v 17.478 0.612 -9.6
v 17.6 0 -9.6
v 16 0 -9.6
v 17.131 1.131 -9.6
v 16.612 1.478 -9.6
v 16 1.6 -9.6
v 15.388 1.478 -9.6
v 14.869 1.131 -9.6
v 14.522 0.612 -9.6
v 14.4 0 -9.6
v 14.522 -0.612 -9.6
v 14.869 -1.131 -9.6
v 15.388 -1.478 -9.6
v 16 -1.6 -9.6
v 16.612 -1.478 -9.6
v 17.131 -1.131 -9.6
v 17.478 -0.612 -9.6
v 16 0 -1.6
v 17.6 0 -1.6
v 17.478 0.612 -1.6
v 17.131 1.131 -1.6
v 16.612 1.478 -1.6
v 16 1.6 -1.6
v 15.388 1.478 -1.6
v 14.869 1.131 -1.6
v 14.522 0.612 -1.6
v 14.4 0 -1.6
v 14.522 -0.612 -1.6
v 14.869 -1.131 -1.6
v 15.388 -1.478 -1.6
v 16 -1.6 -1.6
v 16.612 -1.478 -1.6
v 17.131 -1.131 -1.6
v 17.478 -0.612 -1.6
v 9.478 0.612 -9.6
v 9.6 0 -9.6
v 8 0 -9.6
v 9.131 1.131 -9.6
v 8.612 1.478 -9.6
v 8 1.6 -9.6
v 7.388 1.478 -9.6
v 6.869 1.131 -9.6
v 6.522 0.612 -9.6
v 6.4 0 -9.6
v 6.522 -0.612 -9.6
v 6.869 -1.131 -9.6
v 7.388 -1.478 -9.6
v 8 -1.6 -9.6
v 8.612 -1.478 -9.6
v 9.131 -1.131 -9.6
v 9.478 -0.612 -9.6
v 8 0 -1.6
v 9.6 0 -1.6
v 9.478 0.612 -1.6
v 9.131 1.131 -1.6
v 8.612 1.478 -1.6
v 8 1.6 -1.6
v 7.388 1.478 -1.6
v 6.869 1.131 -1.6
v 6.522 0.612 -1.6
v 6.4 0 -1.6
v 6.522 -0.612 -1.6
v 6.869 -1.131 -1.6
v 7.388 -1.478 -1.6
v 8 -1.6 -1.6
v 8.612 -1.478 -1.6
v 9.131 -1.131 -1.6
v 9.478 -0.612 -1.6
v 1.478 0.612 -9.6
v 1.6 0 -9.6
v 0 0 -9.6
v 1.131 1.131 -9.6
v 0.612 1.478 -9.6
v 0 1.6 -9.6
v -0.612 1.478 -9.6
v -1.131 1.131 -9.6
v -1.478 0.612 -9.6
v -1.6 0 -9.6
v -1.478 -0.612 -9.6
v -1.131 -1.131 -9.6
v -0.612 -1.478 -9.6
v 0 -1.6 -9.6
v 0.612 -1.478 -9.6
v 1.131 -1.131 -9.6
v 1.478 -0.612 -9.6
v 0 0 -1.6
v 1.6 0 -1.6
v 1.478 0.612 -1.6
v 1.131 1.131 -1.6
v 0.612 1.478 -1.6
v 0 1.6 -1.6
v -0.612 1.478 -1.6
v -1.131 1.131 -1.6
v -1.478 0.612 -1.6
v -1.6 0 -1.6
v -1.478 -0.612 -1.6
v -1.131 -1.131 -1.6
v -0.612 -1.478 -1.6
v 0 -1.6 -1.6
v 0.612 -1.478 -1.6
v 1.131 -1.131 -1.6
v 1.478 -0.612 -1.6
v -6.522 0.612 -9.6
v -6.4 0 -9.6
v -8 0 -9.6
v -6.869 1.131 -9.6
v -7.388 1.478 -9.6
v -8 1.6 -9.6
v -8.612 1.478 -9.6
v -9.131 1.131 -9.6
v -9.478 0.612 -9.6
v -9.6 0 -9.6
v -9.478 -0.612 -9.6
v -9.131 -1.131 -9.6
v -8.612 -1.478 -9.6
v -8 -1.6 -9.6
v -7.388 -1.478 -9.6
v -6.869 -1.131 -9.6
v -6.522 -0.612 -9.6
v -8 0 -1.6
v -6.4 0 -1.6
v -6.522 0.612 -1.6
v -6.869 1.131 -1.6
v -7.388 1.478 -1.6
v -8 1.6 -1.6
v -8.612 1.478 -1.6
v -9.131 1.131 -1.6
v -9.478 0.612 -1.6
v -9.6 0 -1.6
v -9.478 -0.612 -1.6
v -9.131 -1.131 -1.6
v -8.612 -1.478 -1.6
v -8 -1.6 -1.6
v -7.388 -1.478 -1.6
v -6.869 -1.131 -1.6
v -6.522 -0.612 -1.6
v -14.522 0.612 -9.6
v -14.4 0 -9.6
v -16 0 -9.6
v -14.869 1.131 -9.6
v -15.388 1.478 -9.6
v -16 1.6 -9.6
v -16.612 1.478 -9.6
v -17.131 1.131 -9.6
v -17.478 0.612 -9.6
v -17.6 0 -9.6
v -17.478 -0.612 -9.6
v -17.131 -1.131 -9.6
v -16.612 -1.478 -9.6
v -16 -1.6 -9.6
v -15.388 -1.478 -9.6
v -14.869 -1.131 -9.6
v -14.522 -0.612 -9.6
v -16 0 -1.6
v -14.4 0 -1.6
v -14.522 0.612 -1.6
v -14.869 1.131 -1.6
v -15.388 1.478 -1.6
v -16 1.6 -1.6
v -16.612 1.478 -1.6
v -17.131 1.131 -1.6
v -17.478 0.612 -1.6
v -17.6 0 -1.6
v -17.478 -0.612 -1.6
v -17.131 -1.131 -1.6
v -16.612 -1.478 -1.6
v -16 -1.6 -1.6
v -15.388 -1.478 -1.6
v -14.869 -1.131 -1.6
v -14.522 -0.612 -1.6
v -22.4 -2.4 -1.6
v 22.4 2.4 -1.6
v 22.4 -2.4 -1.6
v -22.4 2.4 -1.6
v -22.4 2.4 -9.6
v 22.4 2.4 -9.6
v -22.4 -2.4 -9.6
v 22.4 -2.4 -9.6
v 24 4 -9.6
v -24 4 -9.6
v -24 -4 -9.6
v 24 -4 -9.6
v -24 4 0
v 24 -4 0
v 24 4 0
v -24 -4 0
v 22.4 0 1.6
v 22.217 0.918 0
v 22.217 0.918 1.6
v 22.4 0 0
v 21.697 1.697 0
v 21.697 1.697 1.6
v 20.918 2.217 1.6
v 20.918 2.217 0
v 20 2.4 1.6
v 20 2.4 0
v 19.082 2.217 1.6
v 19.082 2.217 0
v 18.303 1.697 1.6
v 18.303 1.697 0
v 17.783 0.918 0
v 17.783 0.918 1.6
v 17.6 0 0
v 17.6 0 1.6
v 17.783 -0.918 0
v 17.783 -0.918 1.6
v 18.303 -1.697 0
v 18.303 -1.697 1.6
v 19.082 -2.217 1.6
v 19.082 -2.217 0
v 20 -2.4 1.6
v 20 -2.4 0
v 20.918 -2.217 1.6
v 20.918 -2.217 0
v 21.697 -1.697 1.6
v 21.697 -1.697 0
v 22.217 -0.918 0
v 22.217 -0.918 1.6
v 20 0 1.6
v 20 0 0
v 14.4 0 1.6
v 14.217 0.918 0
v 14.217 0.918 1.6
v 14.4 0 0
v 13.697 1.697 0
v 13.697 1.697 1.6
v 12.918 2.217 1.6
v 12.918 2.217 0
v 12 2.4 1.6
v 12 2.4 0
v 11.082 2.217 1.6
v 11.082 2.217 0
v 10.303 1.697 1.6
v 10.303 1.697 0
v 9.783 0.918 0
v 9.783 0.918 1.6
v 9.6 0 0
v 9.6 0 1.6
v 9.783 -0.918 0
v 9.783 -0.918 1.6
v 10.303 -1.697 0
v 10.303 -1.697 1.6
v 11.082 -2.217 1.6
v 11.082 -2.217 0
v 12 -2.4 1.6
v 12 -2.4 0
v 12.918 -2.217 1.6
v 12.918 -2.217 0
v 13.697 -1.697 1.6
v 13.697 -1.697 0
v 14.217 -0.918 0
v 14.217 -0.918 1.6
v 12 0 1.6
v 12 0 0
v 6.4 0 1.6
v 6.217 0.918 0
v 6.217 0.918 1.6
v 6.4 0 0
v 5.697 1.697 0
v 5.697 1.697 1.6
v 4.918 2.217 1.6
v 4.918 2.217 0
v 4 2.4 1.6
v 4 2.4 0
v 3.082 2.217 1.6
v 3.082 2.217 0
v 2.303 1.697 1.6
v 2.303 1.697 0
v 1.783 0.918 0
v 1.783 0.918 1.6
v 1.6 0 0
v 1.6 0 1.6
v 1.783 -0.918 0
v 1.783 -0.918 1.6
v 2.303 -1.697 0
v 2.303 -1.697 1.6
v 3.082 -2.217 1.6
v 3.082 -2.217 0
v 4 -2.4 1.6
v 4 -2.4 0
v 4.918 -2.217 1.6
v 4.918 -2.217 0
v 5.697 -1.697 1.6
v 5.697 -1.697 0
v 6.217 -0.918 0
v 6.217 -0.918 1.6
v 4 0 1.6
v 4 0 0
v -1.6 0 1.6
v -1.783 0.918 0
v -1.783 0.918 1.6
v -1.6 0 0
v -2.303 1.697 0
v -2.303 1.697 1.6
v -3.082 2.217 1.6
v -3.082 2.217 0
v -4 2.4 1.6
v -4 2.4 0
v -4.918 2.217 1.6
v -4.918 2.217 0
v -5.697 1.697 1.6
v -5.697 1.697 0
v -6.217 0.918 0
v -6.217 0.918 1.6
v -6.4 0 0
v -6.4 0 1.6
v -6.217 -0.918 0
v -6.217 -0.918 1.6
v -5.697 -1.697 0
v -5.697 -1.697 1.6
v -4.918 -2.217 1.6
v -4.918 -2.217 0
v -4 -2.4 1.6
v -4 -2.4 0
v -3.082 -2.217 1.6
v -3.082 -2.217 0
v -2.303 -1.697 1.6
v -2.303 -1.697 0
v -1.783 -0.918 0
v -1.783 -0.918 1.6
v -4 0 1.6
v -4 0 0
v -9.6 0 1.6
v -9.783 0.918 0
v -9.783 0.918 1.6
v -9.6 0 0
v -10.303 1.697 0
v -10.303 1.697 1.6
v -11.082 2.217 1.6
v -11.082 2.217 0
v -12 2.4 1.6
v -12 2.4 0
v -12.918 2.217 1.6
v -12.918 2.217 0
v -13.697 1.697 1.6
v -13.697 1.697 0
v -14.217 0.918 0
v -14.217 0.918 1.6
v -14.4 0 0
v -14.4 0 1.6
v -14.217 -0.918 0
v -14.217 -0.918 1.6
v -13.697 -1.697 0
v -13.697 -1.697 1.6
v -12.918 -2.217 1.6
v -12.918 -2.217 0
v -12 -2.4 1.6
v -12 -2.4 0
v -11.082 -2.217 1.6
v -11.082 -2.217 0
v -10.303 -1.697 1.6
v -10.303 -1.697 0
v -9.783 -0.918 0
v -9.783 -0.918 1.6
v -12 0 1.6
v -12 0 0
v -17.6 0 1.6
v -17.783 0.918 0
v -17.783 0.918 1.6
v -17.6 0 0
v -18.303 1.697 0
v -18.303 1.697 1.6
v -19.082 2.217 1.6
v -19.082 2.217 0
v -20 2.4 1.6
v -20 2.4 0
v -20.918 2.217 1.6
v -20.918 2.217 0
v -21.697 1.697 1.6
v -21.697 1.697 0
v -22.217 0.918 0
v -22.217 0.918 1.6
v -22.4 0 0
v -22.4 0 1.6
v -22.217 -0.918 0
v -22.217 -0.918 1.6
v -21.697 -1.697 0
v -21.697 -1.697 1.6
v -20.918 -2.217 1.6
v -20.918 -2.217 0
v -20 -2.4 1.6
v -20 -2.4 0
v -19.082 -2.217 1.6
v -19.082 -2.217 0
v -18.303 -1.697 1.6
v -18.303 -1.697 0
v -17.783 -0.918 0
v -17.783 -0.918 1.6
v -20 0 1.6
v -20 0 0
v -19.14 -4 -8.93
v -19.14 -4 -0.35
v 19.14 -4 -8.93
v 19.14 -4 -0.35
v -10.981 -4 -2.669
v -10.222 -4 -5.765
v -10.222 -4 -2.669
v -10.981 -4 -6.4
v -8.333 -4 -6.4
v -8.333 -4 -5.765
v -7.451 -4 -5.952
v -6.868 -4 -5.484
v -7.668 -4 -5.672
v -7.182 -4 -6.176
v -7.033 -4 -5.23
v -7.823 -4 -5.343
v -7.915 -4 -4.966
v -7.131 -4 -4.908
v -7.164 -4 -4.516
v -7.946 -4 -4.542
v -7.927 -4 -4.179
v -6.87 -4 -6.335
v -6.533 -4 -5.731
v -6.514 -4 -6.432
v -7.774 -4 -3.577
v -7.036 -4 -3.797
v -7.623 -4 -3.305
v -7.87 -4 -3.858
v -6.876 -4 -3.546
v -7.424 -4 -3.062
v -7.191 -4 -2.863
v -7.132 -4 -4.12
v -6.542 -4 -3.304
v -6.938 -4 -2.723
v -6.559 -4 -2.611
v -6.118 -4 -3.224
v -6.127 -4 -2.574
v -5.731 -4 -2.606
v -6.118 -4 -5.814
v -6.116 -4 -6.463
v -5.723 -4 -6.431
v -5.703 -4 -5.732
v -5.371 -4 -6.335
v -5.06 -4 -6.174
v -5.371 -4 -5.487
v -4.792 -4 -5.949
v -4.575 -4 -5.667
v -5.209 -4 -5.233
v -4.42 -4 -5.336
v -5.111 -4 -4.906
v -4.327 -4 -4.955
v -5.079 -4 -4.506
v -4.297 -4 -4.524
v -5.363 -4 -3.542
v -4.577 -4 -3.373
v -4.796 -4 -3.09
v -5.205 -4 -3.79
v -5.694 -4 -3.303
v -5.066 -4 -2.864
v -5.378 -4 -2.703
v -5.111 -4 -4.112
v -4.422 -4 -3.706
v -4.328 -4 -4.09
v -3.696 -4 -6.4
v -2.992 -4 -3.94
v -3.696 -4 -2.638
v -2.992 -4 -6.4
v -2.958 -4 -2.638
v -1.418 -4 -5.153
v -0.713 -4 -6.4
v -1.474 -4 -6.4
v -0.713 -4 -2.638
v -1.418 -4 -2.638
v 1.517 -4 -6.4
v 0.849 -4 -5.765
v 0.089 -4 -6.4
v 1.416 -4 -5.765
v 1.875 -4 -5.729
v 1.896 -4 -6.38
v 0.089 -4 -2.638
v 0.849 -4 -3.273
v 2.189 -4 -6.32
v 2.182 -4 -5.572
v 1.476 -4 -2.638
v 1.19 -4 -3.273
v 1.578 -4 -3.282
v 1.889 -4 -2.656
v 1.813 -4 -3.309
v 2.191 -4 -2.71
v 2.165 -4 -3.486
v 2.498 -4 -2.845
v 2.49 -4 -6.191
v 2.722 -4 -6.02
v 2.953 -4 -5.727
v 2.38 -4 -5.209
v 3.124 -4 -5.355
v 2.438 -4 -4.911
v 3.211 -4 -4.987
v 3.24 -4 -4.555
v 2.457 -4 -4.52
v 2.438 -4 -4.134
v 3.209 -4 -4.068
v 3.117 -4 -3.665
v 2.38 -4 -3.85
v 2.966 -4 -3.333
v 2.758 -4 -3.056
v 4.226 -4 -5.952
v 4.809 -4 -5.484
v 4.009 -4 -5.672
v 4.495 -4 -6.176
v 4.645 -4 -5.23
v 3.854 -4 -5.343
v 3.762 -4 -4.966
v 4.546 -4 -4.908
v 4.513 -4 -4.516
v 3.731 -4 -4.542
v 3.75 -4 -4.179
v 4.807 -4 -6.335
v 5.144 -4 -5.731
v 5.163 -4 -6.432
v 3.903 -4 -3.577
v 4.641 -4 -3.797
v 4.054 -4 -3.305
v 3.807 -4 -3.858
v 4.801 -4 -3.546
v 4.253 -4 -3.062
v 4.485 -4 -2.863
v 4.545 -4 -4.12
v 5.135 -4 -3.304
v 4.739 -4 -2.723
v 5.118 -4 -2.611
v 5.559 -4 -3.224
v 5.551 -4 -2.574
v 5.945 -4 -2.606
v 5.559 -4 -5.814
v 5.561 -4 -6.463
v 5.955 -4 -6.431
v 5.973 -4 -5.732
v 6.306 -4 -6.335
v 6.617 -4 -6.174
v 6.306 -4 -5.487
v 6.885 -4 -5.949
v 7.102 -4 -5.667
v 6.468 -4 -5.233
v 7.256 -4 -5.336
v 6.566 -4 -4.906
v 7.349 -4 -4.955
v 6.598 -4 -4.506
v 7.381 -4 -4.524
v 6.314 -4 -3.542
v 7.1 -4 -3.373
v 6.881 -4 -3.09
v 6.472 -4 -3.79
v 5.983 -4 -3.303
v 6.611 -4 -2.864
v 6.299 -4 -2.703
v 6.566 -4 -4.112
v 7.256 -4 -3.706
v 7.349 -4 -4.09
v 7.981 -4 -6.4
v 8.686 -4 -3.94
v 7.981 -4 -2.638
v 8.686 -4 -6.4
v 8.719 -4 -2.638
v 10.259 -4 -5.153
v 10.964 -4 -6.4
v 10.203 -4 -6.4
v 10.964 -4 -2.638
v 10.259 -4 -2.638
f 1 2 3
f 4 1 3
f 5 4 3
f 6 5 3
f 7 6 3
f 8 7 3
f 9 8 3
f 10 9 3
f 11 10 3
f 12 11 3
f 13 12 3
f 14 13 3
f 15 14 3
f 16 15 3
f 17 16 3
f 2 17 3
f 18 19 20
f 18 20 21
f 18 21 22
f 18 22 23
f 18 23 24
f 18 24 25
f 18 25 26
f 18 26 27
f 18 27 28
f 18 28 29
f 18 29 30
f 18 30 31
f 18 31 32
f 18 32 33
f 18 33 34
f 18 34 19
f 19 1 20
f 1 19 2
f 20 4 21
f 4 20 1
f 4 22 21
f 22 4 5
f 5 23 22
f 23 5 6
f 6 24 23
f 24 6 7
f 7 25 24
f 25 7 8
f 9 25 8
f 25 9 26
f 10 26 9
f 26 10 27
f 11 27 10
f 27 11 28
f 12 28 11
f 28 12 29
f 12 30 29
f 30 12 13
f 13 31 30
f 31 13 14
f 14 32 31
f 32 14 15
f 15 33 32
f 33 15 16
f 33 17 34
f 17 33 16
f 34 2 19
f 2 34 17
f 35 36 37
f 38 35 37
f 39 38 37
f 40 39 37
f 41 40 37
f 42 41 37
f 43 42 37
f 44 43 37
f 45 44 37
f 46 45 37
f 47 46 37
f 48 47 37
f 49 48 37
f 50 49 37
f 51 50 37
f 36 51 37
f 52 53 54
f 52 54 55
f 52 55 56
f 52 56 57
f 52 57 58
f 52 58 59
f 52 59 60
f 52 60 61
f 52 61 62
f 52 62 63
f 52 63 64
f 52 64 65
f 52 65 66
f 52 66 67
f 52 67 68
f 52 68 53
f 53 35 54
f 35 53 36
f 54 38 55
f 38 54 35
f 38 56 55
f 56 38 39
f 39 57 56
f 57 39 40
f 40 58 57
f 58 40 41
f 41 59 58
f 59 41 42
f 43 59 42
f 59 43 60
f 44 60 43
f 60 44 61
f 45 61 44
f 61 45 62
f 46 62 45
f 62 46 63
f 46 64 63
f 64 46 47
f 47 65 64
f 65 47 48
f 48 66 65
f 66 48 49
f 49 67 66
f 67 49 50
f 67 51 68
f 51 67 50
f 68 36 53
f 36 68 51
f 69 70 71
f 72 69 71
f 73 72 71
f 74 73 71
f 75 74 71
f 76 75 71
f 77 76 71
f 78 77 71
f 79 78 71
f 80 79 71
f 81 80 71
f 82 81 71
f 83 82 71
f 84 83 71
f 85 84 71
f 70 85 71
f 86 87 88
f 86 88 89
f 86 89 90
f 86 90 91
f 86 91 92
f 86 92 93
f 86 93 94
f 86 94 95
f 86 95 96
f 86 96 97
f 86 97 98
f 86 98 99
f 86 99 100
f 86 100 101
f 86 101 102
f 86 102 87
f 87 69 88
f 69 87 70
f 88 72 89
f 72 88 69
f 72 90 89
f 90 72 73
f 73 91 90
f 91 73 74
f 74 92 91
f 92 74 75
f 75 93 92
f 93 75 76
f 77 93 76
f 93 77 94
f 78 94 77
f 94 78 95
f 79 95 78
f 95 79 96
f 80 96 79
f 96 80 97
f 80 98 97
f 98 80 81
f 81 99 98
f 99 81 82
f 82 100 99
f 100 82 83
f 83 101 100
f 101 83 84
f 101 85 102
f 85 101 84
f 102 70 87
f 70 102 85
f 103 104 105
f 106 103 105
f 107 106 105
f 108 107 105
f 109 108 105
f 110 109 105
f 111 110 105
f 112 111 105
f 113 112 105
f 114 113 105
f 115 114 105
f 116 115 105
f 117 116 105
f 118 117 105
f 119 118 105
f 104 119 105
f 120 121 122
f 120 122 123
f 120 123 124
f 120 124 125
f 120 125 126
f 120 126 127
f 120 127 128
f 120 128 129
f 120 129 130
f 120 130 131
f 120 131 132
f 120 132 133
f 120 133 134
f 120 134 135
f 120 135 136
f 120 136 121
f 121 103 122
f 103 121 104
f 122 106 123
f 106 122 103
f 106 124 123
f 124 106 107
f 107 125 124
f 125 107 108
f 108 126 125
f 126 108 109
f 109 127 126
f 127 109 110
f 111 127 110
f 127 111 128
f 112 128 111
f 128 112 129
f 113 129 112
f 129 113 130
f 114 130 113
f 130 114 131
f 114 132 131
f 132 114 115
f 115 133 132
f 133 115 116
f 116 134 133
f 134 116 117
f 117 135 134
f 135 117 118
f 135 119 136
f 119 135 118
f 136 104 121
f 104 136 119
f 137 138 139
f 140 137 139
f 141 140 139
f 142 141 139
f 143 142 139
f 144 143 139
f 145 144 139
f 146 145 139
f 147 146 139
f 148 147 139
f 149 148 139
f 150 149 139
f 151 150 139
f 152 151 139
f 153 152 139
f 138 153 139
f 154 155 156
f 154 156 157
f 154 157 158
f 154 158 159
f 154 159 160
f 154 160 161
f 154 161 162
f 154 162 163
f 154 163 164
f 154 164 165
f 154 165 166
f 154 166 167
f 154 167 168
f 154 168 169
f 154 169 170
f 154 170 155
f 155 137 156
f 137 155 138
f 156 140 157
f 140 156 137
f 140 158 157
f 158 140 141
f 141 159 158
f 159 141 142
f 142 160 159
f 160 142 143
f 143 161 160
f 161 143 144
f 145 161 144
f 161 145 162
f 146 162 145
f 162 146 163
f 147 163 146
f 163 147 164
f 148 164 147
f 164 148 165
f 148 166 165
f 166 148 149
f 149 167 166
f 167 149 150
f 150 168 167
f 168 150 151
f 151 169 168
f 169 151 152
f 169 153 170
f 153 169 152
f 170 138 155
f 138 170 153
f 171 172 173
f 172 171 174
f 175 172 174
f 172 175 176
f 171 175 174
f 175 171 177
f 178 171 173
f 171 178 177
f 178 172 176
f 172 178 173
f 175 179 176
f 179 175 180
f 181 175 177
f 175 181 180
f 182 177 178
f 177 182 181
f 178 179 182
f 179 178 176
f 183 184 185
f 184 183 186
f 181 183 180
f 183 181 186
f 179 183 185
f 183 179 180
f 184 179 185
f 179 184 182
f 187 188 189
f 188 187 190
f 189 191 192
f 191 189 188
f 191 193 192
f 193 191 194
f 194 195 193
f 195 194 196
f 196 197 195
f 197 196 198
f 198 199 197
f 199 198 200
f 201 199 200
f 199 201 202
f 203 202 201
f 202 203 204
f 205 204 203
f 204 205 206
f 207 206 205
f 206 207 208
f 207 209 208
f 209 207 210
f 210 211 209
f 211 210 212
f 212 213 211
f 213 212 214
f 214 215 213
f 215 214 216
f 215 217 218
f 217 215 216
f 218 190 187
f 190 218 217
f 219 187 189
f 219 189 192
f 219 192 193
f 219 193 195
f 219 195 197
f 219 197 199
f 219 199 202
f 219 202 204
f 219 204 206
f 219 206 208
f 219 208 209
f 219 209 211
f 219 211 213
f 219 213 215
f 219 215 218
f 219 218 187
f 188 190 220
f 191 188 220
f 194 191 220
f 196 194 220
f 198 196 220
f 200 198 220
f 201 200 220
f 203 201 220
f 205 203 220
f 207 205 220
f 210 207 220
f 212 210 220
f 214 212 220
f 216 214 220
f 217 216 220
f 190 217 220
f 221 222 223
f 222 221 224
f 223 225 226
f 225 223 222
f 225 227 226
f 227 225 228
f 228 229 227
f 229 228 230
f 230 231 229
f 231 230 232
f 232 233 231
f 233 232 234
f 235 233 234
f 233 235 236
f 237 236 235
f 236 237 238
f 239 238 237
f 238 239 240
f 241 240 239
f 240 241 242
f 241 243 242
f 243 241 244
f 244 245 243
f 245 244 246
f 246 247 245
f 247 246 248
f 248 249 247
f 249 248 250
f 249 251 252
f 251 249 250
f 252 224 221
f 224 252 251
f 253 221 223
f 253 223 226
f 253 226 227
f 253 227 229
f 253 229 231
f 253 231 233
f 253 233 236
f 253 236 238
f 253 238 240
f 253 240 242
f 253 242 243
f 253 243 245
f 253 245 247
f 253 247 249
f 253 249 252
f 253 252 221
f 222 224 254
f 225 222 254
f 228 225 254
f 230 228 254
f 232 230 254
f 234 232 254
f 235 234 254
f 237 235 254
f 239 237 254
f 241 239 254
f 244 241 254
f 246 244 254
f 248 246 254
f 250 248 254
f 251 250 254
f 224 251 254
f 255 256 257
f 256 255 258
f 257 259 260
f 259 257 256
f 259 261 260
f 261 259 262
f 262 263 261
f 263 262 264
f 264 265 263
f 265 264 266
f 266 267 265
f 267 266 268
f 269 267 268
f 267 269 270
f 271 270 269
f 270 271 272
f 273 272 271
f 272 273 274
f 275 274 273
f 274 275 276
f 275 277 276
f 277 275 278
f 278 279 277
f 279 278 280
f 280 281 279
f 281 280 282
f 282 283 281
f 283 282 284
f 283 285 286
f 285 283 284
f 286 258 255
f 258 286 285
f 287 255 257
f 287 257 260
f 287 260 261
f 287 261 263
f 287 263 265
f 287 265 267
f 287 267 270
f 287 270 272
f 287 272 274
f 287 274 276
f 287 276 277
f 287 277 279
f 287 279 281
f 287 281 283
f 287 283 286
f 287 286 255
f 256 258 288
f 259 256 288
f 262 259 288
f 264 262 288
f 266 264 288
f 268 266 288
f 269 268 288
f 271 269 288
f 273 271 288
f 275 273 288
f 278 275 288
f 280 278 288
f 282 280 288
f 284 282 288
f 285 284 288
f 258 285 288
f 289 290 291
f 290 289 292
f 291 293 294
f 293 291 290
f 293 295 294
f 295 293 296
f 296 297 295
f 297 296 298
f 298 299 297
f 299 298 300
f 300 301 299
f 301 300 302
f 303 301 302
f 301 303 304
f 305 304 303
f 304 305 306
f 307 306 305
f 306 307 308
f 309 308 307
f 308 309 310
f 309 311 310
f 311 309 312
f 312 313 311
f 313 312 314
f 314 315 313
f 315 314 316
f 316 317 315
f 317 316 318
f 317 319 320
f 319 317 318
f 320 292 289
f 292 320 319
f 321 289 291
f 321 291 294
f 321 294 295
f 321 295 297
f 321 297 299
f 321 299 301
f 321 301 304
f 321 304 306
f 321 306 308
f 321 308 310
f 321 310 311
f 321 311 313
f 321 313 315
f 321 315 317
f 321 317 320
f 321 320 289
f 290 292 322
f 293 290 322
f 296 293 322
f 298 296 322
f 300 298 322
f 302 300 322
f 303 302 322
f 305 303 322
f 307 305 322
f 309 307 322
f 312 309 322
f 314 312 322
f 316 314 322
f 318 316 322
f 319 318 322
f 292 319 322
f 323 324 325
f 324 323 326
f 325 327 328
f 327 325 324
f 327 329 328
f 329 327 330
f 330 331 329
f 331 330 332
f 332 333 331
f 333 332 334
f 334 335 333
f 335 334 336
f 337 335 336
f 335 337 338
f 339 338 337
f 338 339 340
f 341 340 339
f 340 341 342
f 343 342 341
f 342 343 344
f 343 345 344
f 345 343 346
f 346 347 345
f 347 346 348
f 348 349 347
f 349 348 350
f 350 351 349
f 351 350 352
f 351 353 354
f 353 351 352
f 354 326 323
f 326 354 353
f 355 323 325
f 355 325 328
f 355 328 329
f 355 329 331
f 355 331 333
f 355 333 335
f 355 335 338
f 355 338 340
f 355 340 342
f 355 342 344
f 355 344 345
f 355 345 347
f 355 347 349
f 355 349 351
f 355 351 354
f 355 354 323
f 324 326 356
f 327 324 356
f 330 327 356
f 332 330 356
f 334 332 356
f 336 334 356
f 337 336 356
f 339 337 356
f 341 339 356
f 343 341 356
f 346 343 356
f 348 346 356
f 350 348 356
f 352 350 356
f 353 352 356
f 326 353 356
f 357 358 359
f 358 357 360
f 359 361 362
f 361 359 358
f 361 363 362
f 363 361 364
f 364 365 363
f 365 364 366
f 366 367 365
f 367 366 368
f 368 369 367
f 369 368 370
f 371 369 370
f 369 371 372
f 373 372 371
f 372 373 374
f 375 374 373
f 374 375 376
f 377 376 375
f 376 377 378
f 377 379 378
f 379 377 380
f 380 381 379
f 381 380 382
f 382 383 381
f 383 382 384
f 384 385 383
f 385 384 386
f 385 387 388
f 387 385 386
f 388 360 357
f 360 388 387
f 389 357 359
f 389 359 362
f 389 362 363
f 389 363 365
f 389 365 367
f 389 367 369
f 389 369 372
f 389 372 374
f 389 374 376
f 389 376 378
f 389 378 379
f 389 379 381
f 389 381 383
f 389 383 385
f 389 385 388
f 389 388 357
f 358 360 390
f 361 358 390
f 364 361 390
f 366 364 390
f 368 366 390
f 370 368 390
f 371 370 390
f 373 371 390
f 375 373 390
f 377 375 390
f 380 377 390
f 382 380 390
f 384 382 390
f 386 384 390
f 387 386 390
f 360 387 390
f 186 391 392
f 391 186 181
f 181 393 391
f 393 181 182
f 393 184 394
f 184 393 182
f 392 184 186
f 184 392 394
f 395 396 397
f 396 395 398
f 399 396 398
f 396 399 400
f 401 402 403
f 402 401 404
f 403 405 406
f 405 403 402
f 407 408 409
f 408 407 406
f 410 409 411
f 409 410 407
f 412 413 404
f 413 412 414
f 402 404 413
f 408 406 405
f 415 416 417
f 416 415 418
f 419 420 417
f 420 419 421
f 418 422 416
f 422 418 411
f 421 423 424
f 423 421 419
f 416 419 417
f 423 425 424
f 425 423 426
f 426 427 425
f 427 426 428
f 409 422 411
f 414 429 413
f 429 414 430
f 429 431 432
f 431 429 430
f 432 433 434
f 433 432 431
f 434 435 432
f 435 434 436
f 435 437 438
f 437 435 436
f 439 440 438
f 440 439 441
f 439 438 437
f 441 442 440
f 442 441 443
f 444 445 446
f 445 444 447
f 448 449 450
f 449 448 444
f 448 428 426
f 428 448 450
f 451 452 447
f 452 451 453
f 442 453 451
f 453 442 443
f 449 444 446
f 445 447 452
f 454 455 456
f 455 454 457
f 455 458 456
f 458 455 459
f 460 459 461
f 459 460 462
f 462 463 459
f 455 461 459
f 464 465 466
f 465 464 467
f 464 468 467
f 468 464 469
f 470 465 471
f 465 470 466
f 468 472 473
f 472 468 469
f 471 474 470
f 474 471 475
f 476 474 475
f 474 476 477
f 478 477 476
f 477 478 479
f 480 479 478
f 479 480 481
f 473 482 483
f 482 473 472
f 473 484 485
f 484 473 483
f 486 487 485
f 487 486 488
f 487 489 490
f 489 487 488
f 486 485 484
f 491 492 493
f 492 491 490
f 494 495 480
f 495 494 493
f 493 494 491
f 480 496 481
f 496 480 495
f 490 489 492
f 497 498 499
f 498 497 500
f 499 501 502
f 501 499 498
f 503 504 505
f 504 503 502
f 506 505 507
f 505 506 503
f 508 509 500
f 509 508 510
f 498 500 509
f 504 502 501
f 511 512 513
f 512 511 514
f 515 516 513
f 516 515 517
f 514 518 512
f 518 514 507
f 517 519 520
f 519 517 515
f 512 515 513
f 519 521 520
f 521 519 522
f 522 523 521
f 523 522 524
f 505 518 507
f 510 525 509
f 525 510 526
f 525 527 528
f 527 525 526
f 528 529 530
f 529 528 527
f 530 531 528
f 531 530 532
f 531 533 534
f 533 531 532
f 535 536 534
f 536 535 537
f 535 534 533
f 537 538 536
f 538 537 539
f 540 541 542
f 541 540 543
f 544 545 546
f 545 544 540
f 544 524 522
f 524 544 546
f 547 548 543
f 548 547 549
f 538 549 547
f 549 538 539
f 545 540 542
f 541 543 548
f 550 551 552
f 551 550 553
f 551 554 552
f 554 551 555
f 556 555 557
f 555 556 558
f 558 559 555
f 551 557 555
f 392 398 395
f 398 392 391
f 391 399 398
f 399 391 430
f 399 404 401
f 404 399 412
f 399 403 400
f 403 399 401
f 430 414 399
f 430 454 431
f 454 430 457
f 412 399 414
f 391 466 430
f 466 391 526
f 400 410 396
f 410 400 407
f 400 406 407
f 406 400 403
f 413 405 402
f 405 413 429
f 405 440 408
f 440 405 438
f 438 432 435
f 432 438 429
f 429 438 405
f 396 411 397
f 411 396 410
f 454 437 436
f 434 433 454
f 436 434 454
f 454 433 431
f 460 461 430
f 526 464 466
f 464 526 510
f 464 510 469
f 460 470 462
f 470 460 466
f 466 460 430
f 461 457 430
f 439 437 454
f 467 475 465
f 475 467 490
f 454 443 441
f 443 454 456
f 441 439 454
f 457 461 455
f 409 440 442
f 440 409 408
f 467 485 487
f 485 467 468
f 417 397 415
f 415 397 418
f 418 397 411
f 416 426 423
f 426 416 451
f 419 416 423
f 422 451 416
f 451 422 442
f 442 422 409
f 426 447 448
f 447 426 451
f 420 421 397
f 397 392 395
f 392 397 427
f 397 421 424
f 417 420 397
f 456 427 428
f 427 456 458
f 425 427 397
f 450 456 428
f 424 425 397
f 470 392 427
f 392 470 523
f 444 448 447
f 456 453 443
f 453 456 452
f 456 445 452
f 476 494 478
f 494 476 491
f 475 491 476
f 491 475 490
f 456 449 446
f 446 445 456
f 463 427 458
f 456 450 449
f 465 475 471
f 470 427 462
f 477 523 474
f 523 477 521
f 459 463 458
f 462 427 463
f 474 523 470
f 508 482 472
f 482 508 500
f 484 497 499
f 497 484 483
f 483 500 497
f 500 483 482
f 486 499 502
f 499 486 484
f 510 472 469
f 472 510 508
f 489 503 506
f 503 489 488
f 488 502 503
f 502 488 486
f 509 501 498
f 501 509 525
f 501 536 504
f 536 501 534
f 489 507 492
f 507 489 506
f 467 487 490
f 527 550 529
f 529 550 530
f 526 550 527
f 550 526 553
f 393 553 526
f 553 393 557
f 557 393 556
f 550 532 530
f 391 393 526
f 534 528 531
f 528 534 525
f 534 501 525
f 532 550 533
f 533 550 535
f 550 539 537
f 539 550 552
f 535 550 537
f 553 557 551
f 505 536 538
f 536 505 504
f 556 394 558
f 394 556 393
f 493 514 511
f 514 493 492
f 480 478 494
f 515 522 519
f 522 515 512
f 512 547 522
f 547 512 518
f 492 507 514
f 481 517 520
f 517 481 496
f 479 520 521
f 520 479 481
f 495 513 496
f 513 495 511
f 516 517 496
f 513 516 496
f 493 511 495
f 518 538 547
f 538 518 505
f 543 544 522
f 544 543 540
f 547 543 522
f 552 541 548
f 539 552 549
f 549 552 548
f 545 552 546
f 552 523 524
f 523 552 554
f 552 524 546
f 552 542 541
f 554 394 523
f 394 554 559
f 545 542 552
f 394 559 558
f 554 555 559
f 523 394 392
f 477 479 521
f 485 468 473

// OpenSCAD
use <../lib.scad>
use <s/3009pt7a.scad>
use <s/3009pt7b.scad>
use <s/3009s01.scad>
function ldraw_lib__3009pt8() = [
// 0 Brick  1 x  6 with "LONDON" White Pattern
// 0 Name: 3009pt8.dat
// 0 Author: J.C. Tchang [tchang]
// 0 !LDRAW_ORG Part UPDATE 2012-03
// 0 !LICENSE Licensed under CC BY 4.0 : see CAreadme.txt
// 
// 0 BFC CERTIFY CCW
  [0,"BFC","CERTIFY"],
  [0,"BFC","CCW"],
// 
// 0 !KEYWORDS BrickLink 3009pb090, Rebrickable 3009pr0040, Set 113-2-DBASE
// 
// 0 !HISTORY 2012-12-28 [PTadmin] Official Update 2012-03
// 
// 
// 1 16 0 0 0 1 0 0 0 1 0 0 0 1 s\3009s01.dat
  [1,16,0,0,0,1,0,0,0,1,0,0,0,1, ldraw_lib__s__3009s01()],
// 0 //
// 4 16 -60 24 -10 -47.85 22.325 -10 -47.85 0.875 -10 -60 0 -10
  [4,16,-60,24,-10,-47.85,22.325,-10,-47.85,0.875,-10,-60,0,-10],
// 4 16 -60 24 -10 60 24 -10 47.85 22.325 -10 -47.85 22.325 -10
  [4,16,-60,24,-10,60,24,-10,47.85,22.325,-10,-47.85,22.325,-10],
// 4 16 47.85 0.875 -10 47.85 22.325 -10 60 24 -10 60 0 -10
  [4,16,47.85,0.875,-10,47.85,22.325,-10,60,24,-10,60,0,-10],
// 4 16 -47.85 0.875 -10 47.85 0.875 -10 60 0 -10 -60 0 -10
  [4,16,-47.85,0.875,-10,47.85,0.875,-10,60,0,-10,-60,0,-10],
// 0 //
// 1 15 0 -1.6 0 1.1 0 0 0 1.1 0 0 0 1 s\3009pt7a.dat
  [1,15,0,-1.6,0,1.1,0,0,0,1.1,0,0,0,1, ldraw_lib__s__3009pt7a()],
// 1 16 0 -1.6 0 1.1 0 0 0 1.1 0 0 0 1 s\3009pt7b.dat
  [1,16,0,-1.6,0,1.1,0,0,0,1.1,0,0,0,1, ldraw_lib__s__3009pt7b()],
];
module ldraw_lib__3009pt8(step=0, col=false, unit=2/5, alt=false, line=0.2, solid=!$preview)
    makepoly(ldraw_lib__3009pt8(), step=step, col=col, unit=unit, alt=alt, line=line, solid=solid);
ldraw_lib__3009pt8(line=0.2);
